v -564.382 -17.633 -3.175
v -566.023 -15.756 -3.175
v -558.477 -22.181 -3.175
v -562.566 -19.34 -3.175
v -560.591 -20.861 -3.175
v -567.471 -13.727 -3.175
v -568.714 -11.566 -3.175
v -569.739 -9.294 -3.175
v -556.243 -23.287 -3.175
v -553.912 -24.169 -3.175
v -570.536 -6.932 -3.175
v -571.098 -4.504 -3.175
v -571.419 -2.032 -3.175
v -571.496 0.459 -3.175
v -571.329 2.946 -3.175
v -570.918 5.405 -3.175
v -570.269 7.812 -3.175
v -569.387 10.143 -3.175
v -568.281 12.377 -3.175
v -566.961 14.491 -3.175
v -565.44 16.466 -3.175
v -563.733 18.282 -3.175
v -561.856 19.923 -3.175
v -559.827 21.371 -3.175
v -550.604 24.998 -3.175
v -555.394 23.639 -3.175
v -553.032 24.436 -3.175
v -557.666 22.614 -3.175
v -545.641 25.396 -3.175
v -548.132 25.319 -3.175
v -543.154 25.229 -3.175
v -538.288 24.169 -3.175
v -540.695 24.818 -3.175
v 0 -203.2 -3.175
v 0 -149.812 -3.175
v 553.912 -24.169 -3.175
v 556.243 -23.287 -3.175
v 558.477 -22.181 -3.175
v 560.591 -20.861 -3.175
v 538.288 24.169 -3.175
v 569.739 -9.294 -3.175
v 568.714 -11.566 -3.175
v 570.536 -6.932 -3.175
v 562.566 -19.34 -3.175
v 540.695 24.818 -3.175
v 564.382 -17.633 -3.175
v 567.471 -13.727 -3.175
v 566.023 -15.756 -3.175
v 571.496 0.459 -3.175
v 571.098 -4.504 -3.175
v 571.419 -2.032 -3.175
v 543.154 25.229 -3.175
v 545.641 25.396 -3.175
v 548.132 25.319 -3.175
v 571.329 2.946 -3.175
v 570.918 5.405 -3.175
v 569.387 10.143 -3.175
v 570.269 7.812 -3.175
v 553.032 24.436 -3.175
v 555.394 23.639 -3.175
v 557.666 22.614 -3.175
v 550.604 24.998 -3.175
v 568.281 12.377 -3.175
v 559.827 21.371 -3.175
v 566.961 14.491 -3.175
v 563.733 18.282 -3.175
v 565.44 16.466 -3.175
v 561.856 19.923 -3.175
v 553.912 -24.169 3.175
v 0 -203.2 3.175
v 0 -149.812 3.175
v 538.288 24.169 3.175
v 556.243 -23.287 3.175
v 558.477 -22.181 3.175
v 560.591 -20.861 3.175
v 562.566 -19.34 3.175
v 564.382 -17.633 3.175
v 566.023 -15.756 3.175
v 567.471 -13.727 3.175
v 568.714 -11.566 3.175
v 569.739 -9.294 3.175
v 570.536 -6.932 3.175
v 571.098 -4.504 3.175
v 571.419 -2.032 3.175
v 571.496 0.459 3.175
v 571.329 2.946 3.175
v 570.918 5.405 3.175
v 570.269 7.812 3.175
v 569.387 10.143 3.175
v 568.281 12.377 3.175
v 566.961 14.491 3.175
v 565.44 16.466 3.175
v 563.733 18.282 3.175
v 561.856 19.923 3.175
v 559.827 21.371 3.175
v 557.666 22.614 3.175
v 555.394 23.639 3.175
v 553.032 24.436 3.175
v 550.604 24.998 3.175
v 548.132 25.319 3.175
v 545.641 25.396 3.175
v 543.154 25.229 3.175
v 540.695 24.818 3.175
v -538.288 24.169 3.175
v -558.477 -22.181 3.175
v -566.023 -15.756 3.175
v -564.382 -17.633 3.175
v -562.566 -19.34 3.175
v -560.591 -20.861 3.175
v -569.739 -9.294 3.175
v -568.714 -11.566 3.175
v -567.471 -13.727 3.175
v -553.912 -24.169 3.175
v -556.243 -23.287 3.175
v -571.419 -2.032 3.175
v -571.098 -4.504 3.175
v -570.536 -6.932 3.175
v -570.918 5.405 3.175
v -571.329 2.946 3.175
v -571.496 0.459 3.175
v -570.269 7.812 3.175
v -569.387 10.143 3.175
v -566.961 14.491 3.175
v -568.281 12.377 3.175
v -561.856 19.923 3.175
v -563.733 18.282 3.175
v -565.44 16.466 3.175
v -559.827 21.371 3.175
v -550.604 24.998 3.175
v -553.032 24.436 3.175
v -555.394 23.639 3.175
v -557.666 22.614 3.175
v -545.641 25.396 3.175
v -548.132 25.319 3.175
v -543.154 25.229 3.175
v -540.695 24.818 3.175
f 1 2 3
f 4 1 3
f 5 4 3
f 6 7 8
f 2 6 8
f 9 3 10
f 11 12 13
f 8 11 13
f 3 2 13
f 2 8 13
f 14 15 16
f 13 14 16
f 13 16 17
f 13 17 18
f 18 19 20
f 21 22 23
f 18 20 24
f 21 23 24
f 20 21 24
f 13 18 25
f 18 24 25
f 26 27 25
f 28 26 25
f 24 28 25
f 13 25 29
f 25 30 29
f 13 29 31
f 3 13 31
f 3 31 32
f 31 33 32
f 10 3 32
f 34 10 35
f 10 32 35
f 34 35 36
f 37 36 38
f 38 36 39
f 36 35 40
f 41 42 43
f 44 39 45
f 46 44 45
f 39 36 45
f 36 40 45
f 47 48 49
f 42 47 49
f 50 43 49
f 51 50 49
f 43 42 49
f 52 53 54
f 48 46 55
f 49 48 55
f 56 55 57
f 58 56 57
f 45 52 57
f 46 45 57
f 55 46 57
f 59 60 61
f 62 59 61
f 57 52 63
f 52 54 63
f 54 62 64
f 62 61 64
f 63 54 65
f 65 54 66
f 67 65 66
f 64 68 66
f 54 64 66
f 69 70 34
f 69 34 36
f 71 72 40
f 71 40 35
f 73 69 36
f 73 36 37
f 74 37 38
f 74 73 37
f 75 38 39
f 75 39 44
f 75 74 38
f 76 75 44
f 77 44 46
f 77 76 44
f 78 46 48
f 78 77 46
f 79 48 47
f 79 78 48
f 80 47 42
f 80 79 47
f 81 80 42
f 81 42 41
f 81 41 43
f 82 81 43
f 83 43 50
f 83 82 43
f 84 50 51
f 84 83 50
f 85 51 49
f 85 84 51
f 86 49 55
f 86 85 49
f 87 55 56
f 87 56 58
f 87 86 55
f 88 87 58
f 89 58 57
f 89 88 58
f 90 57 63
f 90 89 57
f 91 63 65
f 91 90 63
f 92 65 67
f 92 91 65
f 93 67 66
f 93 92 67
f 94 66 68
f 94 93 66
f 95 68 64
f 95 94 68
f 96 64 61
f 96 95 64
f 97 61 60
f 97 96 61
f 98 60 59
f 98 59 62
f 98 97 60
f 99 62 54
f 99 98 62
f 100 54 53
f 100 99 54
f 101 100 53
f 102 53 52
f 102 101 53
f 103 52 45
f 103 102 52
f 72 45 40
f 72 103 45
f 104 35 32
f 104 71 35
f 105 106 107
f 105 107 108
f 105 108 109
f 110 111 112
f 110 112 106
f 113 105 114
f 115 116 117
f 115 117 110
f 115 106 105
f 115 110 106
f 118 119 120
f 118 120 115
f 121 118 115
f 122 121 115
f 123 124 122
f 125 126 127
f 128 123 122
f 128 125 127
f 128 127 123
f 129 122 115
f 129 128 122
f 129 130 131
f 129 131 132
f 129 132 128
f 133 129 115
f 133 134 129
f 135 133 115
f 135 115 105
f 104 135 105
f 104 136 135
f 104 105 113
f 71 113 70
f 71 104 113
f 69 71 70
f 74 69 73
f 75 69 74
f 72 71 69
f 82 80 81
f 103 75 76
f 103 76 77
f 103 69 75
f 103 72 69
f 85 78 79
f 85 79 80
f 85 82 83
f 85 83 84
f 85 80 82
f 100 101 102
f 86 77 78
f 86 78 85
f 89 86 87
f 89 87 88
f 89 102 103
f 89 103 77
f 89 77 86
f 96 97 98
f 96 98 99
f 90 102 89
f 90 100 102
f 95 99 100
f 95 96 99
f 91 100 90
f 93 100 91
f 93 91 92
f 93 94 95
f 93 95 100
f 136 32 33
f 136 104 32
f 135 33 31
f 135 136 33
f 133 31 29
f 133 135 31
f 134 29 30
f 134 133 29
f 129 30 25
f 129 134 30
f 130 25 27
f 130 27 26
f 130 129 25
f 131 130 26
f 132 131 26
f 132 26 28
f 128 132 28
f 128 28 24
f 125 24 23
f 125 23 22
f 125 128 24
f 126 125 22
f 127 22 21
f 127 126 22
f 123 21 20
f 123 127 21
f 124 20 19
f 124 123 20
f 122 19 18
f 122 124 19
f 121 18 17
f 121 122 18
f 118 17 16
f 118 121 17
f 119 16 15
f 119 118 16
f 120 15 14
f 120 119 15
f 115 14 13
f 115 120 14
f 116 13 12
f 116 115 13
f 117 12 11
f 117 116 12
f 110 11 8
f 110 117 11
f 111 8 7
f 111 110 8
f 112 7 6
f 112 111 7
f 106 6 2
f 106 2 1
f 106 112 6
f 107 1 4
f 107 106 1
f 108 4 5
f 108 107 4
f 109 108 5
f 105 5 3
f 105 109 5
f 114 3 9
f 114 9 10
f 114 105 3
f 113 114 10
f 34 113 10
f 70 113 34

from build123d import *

# Parameters (mm, degrees)
BOSS_EXTRUDE1_DEPTH = 3.175


with BuildPart() as part:
    # Sketch1 → Boss-Extrude1 (new, symmetric)
    with BuildSketch(Plane.XY):
        with BuildLine():
            Line((-553.911696572, -24.168934537), (0, -203.2))
            Line((0, -203.2), (553.911696572, -24.168934537))
            ThreePointArc((553.911696572, -24.168934537), (570.268934537, 7.811696572), (538.288303428, 24.168934537))
            Line((538.288303428, 24.168934537), (0, -149.812458319))
            Line((0, -149.812458319), (-538.288303428, 24.168934537))
            ThreePointArc((-538.288303428, 24.168934537), (-570.268934537, 7.811696572), (-553.911696572, -24.168934537))
        make_face()
    extrude(amount=BOSS_EXTRUDE1_DEPTH, both=True)


solid = part.part
